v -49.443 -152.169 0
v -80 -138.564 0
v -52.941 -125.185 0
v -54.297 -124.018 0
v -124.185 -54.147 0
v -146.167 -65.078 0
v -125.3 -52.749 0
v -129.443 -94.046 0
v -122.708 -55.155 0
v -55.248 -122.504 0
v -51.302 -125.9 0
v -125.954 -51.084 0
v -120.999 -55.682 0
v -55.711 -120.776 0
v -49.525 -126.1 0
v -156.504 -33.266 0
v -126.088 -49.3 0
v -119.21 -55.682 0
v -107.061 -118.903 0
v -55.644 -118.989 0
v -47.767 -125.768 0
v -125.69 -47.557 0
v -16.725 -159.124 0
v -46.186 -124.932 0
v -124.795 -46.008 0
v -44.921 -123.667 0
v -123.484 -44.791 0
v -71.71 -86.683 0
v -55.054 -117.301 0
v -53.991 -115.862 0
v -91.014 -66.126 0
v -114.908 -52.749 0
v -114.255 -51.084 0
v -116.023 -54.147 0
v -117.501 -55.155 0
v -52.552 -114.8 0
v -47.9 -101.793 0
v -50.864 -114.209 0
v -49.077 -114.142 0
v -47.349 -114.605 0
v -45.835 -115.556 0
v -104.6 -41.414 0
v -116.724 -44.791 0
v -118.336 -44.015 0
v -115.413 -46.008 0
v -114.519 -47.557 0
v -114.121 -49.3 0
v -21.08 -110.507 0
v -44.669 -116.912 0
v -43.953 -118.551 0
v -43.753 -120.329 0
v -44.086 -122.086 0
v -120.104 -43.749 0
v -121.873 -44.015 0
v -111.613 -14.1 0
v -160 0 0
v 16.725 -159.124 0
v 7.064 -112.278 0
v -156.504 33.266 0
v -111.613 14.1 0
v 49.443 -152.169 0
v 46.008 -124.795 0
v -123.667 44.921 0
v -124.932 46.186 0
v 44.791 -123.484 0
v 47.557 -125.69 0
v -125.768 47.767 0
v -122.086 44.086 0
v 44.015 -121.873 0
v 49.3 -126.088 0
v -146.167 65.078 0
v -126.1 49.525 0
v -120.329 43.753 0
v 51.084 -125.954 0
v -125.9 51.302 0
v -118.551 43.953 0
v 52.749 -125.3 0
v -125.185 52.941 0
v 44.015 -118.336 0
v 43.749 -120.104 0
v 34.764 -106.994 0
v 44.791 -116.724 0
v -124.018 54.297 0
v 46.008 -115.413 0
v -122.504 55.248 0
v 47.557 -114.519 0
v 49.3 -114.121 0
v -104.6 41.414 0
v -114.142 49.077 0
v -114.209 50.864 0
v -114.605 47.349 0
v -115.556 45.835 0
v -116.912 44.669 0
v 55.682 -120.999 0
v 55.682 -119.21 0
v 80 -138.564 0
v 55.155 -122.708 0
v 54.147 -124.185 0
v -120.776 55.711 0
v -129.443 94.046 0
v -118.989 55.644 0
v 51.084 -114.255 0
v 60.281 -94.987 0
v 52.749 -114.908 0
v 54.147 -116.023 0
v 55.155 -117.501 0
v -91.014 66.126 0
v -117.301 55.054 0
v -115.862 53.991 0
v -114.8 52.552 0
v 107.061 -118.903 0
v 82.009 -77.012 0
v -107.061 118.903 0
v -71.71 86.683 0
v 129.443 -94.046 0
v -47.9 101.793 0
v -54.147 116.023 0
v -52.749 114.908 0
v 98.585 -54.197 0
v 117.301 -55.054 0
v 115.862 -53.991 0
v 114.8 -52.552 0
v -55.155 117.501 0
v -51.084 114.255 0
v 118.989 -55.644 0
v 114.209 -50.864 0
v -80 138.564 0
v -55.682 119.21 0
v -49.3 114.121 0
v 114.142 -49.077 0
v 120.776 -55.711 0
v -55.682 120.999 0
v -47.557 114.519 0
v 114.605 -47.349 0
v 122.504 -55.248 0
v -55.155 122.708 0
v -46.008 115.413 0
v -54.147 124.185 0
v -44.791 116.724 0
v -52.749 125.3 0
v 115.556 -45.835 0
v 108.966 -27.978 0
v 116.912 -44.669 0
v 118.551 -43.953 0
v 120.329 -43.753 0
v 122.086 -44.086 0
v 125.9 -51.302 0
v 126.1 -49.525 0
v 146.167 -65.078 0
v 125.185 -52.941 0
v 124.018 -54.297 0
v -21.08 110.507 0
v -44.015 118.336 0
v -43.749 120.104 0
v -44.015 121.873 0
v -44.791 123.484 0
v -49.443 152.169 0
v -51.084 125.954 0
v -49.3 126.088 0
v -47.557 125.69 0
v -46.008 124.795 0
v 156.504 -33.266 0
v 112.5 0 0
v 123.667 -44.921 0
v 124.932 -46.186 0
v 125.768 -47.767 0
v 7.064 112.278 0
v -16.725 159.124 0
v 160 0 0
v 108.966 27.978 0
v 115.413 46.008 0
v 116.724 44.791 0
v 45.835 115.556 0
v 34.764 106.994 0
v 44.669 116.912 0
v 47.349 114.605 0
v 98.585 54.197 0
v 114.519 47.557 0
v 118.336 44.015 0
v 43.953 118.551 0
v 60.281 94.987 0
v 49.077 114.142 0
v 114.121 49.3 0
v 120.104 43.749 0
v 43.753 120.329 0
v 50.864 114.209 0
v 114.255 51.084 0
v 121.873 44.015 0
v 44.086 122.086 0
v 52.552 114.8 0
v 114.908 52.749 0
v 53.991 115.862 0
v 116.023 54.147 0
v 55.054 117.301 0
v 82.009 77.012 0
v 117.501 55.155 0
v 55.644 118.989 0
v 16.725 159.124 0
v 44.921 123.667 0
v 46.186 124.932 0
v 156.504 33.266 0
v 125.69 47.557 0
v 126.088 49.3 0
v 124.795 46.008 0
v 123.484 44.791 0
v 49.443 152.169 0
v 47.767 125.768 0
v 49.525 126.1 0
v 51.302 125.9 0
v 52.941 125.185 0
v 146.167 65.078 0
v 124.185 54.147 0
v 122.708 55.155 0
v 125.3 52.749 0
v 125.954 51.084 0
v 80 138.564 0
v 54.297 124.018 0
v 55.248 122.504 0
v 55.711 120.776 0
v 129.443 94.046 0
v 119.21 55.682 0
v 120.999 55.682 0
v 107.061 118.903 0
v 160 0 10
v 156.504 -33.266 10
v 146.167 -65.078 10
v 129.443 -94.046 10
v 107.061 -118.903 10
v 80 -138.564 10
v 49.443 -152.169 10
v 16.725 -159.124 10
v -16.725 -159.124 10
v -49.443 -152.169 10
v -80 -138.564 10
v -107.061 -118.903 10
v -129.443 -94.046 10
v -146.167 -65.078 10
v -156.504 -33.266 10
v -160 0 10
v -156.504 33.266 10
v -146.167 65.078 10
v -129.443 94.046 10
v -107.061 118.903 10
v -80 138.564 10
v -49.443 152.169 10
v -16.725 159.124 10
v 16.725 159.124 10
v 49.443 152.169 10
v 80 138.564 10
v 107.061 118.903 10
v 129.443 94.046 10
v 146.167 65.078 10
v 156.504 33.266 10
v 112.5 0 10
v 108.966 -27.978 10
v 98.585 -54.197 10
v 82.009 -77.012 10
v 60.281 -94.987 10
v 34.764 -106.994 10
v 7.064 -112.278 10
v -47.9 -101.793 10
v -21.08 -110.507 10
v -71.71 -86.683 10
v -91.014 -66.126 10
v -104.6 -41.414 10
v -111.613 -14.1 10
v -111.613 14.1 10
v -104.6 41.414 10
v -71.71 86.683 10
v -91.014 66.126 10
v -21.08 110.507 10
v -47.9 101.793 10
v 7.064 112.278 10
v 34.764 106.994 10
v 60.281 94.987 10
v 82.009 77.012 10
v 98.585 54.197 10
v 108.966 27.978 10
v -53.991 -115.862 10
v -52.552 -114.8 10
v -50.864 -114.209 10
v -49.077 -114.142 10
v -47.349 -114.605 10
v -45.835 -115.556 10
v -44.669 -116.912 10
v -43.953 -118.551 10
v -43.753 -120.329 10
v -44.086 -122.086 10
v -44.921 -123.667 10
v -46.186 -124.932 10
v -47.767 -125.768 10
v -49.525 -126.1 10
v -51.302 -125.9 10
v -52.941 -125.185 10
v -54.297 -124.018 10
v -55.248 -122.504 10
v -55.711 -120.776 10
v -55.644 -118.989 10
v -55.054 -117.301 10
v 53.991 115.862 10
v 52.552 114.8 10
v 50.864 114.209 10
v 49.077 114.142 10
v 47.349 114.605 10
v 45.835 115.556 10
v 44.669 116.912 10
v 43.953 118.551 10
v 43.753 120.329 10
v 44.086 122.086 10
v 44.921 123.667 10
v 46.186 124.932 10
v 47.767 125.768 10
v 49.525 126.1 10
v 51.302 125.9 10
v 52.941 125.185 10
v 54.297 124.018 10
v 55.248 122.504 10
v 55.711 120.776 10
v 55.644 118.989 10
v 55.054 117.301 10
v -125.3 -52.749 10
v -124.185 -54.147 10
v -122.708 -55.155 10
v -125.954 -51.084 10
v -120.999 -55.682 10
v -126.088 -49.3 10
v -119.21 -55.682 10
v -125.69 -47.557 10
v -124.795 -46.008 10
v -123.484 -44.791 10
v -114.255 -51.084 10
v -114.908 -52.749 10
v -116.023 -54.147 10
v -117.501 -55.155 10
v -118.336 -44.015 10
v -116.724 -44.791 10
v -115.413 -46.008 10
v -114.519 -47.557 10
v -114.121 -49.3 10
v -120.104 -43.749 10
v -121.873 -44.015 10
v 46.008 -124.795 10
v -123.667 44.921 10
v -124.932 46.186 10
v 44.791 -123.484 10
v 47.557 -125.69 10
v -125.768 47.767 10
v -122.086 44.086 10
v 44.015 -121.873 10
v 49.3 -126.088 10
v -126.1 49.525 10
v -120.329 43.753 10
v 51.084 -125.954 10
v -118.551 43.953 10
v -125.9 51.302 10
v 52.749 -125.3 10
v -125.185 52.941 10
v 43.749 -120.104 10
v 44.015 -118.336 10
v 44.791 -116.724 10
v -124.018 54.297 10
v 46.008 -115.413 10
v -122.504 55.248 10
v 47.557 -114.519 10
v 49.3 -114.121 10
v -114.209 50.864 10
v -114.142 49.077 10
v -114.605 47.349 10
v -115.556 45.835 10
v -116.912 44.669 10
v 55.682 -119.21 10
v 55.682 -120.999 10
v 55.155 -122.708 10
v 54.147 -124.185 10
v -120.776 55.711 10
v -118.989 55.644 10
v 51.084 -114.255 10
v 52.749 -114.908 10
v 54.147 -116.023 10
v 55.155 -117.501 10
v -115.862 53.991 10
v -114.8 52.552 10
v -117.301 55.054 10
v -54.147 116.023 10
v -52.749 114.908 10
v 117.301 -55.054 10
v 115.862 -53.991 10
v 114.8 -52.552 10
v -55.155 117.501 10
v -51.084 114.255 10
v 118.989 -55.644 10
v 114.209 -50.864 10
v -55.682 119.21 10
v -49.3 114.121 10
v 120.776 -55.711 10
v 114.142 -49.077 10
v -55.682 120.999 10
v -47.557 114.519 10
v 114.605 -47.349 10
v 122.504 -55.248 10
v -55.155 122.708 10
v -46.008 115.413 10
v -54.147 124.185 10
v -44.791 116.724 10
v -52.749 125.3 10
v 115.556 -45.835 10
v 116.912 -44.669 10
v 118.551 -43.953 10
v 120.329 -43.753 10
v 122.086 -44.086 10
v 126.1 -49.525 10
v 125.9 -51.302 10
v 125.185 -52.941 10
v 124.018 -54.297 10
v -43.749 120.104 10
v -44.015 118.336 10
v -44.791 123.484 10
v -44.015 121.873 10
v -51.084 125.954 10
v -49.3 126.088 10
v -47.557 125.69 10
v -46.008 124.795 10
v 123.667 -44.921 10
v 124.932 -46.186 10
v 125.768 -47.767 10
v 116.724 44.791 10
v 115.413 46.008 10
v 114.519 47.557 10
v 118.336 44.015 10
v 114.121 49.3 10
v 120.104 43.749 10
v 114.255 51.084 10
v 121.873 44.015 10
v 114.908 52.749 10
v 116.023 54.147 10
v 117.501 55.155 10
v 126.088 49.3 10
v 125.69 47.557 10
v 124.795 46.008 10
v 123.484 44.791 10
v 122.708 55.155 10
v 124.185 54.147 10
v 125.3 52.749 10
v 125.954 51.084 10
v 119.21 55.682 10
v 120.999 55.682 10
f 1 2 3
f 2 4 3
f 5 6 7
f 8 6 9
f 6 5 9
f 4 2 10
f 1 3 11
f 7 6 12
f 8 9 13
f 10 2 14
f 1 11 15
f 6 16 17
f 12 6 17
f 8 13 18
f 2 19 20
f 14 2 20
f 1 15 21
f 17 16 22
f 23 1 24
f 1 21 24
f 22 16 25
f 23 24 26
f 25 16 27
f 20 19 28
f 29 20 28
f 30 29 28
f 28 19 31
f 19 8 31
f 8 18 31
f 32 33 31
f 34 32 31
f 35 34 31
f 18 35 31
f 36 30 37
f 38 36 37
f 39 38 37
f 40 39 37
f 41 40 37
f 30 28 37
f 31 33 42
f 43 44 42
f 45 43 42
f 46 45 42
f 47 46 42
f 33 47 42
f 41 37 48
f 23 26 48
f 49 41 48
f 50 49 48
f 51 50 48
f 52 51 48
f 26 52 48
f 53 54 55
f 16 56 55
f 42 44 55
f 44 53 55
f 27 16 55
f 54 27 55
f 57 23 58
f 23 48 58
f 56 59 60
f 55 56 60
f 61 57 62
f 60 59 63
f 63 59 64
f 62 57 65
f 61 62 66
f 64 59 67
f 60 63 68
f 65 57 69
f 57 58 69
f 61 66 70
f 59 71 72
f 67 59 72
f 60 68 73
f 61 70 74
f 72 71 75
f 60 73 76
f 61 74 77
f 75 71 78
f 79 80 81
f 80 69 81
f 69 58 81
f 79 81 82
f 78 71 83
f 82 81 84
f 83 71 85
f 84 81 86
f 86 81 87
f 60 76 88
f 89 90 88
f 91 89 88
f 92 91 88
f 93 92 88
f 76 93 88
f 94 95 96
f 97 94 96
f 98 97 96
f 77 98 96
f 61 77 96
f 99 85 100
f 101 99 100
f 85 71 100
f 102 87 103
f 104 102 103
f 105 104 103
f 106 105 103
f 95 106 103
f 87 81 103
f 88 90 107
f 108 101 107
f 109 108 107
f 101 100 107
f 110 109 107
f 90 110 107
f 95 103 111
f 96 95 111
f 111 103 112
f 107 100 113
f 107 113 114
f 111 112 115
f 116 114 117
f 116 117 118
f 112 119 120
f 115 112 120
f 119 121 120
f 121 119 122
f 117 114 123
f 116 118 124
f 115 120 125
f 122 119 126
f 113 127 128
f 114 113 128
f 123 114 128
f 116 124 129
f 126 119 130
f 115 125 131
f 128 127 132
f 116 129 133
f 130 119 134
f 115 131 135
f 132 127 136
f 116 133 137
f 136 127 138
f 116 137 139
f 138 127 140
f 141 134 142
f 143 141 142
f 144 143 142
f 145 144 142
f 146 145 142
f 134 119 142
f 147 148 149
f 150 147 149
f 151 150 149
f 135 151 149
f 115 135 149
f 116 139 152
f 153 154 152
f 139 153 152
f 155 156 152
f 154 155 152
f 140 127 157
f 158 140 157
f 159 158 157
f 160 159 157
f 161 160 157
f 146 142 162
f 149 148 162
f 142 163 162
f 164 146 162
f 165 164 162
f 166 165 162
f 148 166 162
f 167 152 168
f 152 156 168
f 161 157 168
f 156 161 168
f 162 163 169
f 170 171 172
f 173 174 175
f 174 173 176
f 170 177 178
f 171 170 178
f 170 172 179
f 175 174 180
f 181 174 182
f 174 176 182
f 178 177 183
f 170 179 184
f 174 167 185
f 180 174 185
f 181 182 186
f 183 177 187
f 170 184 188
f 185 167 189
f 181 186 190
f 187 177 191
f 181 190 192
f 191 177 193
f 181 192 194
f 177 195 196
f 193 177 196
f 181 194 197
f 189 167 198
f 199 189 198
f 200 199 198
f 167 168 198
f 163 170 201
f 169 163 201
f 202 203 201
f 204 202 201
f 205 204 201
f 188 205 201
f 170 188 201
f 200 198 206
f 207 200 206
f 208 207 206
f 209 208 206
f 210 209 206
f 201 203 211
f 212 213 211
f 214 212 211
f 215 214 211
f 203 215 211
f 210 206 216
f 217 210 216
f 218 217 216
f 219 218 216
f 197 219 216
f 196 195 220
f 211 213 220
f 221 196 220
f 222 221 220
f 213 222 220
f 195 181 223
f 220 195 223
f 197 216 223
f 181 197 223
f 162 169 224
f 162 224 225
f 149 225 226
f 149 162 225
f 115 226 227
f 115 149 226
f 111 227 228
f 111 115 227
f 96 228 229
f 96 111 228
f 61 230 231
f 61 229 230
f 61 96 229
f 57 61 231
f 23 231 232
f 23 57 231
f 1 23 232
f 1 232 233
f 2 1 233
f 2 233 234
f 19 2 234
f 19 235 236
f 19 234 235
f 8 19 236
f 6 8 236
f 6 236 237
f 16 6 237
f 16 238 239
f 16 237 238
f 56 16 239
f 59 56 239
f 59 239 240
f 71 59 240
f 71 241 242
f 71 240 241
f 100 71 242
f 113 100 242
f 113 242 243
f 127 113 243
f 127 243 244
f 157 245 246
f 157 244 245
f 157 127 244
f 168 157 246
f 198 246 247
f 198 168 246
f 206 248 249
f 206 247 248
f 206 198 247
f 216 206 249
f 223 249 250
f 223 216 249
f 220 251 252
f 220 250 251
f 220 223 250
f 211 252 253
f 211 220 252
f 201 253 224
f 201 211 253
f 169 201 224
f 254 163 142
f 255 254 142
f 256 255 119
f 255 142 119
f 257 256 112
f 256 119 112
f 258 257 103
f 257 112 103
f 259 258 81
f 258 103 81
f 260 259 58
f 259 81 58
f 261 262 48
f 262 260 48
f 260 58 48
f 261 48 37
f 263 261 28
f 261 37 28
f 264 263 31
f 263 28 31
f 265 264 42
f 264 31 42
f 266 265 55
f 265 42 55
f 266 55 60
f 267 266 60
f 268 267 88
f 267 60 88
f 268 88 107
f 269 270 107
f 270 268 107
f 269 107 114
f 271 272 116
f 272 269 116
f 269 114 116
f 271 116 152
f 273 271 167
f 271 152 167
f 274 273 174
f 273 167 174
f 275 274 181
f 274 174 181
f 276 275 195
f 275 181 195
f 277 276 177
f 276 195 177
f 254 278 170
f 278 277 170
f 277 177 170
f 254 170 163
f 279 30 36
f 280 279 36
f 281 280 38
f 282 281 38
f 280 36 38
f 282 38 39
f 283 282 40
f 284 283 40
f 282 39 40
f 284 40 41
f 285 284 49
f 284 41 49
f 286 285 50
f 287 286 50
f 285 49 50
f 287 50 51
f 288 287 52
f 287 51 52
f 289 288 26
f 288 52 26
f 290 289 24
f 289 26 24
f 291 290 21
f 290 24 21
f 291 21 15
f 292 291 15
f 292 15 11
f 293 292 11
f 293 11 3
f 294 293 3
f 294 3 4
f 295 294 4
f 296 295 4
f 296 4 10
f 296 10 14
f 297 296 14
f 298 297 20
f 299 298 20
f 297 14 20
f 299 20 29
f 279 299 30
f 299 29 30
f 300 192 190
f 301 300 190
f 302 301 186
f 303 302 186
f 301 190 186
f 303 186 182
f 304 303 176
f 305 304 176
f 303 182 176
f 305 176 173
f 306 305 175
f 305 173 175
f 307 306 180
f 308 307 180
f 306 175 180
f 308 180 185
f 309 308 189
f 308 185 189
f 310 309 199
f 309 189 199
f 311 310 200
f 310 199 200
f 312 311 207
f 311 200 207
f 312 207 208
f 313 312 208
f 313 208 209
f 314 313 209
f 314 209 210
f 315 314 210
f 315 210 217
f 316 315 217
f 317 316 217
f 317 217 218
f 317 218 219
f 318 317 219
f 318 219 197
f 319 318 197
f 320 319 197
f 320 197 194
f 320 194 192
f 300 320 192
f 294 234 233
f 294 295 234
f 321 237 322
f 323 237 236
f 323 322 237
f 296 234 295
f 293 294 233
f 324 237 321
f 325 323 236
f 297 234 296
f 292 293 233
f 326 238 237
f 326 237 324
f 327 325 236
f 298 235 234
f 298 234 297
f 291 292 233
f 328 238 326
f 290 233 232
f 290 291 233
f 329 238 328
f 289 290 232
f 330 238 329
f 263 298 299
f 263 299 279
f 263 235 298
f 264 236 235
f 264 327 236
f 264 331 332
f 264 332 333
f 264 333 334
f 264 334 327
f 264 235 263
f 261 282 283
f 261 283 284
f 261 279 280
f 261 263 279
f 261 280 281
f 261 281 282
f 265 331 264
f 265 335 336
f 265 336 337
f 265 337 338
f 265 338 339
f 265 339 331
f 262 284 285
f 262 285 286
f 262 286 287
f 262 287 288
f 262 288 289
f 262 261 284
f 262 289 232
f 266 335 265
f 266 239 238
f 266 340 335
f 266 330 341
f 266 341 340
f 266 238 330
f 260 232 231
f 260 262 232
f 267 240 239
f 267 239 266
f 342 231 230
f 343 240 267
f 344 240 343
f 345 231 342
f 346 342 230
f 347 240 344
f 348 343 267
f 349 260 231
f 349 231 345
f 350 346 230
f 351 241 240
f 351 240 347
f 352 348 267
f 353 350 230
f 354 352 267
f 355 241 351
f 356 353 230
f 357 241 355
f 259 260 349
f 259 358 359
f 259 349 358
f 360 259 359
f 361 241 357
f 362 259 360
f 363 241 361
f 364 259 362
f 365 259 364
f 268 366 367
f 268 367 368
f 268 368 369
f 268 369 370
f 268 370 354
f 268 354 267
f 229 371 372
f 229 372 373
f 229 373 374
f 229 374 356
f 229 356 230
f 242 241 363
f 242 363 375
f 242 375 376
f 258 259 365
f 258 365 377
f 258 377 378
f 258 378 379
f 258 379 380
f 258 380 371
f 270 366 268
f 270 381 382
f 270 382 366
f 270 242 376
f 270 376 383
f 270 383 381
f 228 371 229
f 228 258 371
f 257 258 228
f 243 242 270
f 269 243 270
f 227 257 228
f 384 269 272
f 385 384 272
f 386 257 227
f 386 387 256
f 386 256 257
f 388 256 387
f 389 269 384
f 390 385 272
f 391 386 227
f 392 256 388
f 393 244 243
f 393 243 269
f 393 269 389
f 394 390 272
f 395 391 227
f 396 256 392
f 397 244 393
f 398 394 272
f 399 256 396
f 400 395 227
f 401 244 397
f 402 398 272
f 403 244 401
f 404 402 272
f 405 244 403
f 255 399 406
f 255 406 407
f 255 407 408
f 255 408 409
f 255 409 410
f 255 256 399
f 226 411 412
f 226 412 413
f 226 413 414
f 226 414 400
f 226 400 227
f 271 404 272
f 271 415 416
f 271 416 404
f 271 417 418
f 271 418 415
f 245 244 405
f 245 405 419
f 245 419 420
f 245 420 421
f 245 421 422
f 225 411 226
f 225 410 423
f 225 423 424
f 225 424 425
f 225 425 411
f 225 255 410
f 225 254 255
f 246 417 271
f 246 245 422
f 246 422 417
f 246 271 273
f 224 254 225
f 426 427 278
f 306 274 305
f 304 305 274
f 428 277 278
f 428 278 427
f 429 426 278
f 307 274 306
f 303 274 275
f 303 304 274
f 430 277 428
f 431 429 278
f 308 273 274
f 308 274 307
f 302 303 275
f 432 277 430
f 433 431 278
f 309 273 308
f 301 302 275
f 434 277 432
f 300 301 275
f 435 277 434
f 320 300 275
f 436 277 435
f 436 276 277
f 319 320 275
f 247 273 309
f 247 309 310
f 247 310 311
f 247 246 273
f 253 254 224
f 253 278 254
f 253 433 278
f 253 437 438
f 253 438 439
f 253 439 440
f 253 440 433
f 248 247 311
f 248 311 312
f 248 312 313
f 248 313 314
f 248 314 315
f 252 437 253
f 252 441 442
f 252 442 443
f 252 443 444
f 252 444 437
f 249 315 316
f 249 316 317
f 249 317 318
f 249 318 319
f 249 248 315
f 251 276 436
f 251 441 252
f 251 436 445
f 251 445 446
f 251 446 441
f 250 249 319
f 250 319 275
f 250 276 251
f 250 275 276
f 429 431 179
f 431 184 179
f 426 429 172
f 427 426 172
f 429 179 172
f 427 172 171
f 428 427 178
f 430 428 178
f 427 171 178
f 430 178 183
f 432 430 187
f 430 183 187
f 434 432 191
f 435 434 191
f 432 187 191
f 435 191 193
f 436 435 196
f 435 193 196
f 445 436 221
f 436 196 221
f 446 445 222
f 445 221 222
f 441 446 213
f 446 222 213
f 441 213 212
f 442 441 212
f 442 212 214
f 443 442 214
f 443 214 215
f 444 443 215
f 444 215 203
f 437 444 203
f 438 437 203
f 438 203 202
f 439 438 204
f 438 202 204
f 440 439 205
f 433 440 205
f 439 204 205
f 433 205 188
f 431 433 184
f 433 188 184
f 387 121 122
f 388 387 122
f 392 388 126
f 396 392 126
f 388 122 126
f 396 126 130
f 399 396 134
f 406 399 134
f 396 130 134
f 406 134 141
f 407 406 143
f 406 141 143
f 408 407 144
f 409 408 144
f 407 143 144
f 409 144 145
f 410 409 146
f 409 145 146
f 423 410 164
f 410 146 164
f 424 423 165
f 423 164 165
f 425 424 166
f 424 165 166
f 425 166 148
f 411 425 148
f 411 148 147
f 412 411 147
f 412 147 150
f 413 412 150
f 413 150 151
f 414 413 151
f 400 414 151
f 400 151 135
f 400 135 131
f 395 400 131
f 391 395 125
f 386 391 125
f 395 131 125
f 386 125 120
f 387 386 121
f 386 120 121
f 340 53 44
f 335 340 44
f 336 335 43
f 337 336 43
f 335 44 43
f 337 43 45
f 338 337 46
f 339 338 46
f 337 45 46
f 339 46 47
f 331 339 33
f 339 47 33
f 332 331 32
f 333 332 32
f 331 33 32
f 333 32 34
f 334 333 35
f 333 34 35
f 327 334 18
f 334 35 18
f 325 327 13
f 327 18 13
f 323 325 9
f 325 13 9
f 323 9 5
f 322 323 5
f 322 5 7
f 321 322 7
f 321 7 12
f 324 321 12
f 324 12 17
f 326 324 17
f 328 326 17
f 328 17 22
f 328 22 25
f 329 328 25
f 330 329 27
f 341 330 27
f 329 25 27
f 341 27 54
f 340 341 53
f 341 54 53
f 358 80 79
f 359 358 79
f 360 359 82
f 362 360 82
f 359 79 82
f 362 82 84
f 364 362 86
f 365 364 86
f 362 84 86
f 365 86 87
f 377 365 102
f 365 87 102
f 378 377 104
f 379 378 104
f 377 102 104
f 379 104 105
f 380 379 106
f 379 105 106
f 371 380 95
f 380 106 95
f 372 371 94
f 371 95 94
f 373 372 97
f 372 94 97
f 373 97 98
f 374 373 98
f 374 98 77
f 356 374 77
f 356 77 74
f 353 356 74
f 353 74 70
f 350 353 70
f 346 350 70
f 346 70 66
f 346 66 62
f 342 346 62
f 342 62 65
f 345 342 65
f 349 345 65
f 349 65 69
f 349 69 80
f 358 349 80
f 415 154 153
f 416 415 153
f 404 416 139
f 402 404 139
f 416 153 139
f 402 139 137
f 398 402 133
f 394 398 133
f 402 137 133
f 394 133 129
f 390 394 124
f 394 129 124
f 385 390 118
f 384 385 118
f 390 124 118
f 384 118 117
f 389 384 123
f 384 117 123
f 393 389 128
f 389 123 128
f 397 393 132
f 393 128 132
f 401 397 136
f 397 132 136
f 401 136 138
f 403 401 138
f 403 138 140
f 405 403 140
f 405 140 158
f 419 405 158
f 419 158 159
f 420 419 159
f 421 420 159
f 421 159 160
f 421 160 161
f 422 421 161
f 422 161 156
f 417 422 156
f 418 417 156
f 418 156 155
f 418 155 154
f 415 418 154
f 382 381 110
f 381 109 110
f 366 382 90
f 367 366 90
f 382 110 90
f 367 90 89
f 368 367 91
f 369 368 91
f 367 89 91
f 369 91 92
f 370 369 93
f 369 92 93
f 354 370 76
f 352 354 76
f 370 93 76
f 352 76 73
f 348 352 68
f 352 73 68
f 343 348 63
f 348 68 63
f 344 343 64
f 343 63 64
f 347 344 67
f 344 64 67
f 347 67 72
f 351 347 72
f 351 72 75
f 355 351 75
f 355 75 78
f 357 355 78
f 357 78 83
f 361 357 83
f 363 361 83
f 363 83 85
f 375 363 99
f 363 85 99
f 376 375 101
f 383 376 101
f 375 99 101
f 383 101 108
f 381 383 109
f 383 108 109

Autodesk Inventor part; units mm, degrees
ref_plane "YZ Plane" through (0, 0, 0) normal (1, 0, 0) x (0, 1, 0)
ref_plane "XZ Plane" through (0, 0, 0) normal (0, 1, 0) x (-1, 0, 0)
ref_plane "XY Plane" through (0, 0, 0) normal (0, 0, 1) x (1, 0, 0)
sketch "Эскиз1" plane through (0, 0, 0) normal (0, 0, 1) x (1, 0, 0)
  circle A0 centre (0, 0) radius 112.5
  circle A1 centre (0, 0) radius 160
  dimension "d0" = 225
  dimension "d1" = 320
extrude "Выдавливание1" add sketch "Эскиз1" along normal blind 10
sketch "Эскиз2" plane through (0, 0, 10) normal (0, 0, 1) x (1, 0, 0)
  line L0 (0, 0) -> (120.1043, 49.7488)
  line L1 (-224, 0) -> (224, 0) projected
  dimension "d4" = 130
  dimension "d5" = 22.5
hole "Отверстие1" at (120.1043, 49.7488, 10) direction (0, 0, -1) diameter 12 end through all
pattern_circular "Круговой массив1" count 8 over 360 about axis through (0, 0, 0) along (0, 0, 1) of "Отверстие1"
properties part number "Придав перегородки1" material "Сталь, высокопрочная, низколегированная"
